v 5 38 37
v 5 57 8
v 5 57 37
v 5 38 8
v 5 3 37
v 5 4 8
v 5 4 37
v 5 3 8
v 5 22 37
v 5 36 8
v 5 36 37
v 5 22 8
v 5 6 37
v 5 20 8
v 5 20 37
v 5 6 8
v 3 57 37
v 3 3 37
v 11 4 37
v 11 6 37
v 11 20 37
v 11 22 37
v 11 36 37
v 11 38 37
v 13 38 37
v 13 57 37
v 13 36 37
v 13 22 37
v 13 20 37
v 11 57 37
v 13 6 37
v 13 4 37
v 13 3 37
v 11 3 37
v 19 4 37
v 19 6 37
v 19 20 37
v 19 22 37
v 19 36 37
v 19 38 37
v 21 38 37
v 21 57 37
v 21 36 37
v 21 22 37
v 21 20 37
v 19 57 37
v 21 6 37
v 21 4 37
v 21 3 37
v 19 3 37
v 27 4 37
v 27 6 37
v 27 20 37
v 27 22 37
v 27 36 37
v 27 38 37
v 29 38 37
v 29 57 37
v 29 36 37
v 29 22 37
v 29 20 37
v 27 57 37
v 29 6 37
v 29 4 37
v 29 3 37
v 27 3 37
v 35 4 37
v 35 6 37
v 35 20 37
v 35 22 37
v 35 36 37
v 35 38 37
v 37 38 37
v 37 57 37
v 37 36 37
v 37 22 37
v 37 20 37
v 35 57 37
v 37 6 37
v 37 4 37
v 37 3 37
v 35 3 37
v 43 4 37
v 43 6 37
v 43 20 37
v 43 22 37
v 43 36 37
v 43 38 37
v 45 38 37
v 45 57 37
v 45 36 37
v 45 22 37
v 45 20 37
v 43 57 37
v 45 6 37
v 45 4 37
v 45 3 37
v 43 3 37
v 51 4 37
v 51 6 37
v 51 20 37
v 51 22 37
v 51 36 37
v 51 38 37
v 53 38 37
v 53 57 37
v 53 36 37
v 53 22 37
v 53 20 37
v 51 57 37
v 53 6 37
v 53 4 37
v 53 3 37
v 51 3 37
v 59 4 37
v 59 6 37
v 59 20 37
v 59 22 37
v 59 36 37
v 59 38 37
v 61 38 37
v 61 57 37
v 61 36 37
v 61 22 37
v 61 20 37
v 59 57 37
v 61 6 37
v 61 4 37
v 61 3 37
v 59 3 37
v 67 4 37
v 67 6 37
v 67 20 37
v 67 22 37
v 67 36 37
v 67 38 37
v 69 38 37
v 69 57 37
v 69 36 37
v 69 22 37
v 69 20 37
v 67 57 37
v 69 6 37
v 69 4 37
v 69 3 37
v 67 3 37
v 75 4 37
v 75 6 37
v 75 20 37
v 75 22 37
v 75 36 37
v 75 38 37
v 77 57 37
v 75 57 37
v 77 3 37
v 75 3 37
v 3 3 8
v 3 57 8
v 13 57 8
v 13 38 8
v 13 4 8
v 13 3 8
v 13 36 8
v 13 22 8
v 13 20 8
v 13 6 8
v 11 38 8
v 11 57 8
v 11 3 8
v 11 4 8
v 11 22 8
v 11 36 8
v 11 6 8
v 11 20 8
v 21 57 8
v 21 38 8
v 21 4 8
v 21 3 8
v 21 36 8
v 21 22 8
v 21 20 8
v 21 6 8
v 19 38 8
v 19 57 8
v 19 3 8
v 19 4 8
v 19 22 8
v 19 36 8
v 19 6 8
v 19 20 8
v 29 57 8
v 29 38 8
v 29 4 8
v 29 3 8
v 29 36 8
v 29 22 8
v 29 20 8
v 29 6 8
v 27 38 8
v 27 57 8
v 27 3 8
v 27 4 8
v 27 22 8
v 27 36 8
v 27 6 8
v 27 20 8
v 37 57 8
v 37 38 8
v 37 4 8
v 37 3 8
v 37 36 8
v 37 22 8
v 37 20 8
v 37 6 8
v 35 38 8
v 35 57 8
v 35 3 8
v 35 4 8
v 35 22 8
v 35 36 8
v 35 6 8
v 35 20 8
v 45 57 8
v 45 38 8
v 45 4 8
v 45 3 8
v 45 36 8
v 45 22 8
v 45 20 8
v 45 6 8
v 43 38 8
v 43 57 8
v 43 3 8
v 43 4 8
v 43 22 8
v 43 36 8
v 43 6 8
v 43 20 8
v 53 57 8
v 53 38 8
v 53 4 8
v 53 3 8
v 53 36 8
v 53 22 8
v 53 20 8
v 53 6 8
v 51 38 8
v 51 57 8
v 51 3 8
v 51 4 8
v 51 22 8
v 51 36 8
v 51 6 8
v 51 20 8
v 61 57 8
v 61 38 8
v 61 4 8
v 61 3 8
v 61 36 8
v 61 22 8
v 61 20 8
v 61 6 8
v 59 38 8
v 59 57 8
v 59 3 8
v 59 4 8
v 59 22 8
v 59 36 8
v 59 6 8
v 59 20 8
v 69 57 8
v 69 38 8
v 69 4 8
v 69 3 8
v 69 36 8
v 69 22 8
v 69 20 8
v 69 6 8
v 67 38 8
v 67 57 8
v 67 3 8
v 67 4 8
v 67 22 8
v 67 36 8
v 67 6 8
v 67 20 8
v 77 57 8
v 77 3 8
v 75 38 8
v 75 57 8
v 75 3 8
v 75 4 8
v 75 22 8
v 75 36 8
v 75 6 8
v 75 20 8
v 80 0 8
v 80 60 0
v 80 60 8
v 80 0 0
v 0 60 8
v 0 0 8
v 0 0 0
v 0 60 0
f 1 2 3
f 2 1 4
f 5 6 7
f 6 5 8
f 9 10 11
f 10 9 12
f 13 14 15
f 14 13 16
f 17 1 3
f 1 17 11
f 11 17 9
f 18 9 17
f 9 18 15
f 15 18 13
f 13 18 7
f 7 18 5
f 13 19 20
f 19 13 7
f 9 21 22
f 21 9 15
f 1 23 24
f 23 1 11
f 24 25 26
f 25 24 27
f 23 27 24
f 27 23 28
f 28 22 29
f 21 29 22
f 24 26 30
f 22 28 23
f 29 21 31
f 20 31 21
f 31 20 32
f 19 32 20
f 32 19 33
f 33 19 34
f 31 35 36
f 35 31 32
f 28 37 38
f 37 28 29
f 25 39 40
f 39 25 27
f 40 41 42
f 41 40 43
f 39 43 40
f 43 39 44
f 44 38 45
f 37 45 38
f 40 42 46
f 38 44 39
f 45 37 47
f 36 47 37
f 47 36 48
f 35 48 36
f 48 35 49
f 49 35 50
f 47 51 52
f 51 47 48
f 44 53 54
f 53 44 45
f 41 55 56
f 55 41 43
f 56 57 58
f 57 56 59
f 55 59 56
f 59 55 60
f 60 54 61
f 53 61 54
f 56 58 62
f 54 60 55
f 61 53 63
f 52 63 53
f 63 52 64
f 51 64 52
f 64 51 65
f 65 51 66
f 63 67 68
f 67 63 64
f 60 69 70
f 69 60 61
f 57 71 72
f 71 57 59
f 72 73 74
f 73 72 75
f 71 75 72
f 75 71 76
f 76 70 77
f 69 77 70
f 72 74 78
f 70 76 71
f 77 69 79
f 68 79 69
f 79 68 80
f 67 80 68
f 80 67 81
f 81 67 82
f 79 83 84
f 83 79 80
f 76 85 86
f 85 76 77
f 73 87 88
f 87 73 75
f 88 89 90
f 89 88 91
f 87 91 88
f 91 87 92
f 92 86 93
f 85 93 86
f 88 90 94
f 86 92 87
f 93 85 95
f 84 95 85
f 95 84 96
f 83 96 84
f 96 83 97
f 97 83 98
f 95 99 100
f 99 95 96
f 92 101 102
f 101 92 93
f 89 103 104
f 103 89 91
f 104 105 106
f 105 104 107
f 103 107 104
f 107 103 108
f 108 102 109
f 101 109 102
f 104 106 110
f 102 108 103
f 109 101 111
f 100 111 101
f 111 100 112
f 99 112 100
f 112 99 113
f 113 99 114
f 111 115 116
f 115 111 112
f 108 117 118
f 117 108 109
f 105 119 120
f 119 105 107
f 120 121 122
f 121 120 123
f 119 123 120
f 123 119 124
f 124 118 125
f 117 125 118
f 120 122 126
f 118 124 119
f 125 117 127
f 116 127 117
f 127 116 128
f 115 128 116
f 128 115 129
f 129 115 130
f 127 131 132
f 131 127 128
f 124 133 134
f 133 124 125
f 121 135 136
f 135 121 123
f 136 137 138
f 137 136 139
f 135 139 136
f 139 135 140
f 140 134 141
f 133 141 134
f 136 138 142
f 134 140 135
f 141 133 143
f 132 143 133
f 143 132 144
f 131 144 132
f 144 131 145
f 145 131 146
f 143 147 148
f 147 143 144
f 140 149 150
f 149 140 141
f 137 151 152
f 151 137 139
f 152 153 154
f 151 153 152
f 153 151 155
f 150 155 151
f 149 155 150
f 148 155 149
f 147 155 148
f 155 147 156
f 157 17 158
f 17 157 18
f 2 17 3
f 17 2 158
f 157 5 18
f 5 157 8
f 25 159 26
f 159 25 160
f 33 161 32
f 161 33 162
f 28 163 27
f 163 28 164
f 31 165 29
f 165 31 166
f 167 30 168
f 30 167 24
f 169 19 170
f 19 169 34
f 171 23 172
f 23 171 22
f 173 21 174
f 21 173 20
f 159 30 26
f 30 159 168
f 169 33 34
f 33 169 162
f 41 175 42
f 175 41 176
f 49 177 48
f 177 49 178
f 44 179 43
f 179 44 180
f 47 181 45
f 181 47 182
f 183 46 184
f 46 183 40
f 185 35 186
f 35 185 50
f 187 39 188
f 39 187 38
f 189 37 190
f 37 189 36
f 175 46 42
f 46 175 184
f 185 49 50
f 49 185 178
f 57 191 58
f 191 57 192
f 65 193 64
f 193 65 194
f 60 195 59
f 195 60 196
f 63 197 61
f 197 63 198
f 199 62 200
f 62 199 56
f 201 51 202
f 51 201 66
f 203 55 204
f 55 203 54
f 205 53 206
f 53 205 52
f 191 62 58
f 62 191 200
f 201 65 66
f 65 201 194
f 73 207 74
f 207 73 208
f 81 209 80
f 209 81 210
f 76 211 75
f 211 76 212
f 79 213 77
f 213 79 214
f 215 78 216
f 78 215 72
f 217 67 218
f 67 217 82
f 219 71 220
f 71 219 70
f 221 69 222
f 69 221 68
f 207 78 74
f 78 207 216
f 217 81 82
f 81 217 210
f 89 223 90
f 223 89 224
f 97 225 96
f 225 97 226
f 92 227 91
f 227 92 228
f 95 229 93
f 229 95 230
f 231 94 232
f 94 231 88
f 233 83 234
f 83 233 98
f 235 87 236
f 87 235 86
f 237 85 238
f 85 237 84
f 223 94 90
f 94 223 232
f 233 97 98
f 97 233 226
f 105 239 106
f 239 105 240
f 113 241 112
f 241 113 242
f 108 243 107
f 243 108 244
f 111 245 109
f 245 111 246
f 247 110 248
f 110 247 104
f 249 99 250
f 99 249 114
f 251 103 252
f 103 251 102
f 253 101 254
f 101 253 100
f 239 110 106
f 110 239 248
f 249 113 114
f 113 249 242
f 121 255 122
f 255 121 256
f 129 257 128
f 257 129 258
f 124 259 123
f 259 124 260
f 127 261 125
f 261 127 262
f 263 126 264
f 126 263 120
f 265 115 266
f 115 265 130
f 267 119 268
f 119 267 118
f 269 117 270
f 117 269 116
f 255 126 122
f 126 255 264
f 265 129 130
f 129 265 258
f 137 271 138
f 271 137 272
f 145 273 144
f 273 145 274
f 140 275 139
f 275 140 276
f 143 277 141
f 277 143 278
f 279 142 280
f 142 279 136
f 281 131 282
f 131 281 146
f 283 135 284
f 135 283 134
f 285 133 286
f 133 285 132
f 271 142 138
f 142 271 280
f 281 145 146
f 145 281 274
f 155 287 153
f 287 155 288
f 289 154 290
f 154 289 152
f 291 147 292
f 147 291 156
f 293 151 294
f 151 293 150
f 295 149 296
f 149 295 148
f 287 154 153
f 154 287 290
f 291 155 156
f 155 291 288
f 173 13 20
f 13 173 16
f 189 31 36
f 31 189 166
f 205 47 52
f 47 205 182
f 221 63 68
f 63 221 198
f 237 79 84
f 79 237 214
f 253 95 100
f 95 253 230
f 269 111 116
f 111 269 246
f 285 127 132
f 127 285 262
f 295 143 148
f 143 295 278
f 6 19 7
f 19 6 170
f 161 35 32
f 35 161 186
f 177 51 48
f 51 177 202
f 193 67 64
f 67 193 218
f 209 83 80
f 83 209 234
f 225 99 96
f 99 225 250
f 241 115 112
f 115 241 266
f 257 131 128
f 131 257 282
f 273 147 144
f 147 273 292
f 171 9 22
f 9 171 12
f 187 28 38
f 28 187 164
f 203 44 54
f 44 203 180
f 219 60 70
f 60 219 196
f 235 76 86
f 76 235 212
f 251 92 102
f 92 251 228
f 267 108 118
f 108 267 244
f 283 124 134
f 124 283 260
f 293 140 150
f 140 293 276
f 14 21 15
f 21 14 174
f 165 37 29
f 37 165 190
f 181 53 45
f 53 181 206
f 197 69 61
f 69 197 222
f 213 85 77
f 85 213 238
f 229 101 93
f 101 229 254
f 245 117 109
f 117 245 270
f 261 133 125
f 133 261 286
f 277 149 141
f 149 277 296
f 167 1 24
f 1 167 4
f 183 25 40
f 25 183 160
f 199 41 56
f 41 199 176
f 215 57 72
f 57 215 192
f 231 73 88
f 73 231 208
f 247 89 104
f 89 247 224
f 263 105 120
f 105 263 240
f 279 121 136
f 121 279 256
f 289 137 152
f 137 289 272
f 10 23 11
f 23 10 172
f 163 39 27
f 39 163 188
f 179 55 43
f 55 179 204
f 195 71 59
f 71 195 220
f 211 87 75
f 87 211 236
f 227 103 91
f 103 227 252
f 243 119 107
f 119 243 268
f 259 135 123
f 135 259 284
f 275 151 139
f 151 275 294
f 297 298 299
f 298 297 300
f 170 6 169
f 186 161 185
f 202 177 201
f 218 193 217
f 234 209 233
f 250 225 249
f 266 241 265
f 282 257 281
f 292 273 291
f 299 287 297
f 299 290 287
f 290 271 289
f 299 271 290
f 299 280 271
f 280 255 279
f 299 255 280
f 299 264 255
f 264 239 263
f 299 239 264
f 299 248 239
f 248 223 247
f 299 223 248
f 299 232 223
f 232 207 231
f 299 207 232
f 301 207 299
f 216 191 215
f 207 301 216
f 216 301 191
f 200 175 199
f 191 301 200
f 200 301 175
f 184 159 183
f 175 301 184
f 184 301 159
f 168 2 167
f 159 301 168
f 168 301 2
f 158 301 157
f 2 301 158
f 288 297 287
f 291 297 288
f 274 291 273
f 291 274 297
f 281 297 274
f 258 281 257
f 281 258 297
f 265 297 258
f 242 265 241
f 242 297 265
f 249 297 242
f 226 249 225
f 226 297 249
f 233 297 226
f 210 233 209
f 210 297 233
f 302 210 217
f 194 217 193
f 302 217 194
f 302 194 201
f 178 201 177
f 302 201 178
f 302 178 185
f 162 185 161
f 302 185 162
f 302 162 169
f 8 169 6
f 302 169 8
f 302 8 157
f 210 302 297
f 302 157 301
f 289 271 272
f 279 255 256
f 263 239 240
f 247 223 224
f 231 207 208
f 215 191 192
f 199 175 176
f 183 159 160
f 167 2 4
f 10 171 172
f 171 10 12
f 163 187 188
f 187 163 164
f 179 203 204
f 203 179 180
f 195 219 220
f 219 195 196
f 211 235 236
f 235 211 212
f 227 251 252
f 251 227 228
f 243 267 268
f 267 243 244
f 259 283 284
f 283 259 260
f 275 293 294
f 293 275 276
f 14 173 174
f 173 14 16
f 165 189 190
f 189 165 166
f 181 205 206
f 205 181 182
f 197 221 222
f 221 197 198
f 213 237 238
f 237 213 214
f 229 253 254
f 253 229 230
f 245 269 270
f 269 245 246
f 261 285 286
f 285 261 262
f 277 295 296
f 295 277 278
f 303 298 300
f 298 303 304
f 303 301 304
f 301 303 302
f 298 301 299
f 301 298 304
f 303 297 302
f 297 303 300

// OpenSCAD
$fn = 32;

// ----------------------------------------------------------------------
// Heatsink: cross fin block
// ----------------------------------------------------------------------

// --- parameters (mm) ---
base_l = 80;              // base length, X
base_w = 60;              // base width, Y
base_t = 8;               // base plate thickness
fin_h = 30;               // fin height above the base
fin_t = 2;                // fin thickness
edge = 3;                 // margin from the base ends
pitch = 8;                // fin pitch
rib_pitch = 16;           // cross rib pitch

n_fins = floor((base_l - 2 * edge - fin_t) / pitch) + 1;  // fin count
total_h = base_t + fin_h - 1;  // overall height
n_ribs = floor((base_w - 2 * edge) / rib_pitch);  // rib count

union() {
  cube([base_l, base_w, base_t]);
  for (i = [0 : n_fins - 1])
    translate([edge + i * pitch, edge, base_t - 1])
      cube([fin_t, base_w - 2 * edge, fin_h]);
  for (i = [0 : n_ribs - 1])
    translate([edge, edge + 1 + i * rib_pitch, base_t - 1])
      cube([base_l - 2 * edge, fin_t, fin_h]);
}
